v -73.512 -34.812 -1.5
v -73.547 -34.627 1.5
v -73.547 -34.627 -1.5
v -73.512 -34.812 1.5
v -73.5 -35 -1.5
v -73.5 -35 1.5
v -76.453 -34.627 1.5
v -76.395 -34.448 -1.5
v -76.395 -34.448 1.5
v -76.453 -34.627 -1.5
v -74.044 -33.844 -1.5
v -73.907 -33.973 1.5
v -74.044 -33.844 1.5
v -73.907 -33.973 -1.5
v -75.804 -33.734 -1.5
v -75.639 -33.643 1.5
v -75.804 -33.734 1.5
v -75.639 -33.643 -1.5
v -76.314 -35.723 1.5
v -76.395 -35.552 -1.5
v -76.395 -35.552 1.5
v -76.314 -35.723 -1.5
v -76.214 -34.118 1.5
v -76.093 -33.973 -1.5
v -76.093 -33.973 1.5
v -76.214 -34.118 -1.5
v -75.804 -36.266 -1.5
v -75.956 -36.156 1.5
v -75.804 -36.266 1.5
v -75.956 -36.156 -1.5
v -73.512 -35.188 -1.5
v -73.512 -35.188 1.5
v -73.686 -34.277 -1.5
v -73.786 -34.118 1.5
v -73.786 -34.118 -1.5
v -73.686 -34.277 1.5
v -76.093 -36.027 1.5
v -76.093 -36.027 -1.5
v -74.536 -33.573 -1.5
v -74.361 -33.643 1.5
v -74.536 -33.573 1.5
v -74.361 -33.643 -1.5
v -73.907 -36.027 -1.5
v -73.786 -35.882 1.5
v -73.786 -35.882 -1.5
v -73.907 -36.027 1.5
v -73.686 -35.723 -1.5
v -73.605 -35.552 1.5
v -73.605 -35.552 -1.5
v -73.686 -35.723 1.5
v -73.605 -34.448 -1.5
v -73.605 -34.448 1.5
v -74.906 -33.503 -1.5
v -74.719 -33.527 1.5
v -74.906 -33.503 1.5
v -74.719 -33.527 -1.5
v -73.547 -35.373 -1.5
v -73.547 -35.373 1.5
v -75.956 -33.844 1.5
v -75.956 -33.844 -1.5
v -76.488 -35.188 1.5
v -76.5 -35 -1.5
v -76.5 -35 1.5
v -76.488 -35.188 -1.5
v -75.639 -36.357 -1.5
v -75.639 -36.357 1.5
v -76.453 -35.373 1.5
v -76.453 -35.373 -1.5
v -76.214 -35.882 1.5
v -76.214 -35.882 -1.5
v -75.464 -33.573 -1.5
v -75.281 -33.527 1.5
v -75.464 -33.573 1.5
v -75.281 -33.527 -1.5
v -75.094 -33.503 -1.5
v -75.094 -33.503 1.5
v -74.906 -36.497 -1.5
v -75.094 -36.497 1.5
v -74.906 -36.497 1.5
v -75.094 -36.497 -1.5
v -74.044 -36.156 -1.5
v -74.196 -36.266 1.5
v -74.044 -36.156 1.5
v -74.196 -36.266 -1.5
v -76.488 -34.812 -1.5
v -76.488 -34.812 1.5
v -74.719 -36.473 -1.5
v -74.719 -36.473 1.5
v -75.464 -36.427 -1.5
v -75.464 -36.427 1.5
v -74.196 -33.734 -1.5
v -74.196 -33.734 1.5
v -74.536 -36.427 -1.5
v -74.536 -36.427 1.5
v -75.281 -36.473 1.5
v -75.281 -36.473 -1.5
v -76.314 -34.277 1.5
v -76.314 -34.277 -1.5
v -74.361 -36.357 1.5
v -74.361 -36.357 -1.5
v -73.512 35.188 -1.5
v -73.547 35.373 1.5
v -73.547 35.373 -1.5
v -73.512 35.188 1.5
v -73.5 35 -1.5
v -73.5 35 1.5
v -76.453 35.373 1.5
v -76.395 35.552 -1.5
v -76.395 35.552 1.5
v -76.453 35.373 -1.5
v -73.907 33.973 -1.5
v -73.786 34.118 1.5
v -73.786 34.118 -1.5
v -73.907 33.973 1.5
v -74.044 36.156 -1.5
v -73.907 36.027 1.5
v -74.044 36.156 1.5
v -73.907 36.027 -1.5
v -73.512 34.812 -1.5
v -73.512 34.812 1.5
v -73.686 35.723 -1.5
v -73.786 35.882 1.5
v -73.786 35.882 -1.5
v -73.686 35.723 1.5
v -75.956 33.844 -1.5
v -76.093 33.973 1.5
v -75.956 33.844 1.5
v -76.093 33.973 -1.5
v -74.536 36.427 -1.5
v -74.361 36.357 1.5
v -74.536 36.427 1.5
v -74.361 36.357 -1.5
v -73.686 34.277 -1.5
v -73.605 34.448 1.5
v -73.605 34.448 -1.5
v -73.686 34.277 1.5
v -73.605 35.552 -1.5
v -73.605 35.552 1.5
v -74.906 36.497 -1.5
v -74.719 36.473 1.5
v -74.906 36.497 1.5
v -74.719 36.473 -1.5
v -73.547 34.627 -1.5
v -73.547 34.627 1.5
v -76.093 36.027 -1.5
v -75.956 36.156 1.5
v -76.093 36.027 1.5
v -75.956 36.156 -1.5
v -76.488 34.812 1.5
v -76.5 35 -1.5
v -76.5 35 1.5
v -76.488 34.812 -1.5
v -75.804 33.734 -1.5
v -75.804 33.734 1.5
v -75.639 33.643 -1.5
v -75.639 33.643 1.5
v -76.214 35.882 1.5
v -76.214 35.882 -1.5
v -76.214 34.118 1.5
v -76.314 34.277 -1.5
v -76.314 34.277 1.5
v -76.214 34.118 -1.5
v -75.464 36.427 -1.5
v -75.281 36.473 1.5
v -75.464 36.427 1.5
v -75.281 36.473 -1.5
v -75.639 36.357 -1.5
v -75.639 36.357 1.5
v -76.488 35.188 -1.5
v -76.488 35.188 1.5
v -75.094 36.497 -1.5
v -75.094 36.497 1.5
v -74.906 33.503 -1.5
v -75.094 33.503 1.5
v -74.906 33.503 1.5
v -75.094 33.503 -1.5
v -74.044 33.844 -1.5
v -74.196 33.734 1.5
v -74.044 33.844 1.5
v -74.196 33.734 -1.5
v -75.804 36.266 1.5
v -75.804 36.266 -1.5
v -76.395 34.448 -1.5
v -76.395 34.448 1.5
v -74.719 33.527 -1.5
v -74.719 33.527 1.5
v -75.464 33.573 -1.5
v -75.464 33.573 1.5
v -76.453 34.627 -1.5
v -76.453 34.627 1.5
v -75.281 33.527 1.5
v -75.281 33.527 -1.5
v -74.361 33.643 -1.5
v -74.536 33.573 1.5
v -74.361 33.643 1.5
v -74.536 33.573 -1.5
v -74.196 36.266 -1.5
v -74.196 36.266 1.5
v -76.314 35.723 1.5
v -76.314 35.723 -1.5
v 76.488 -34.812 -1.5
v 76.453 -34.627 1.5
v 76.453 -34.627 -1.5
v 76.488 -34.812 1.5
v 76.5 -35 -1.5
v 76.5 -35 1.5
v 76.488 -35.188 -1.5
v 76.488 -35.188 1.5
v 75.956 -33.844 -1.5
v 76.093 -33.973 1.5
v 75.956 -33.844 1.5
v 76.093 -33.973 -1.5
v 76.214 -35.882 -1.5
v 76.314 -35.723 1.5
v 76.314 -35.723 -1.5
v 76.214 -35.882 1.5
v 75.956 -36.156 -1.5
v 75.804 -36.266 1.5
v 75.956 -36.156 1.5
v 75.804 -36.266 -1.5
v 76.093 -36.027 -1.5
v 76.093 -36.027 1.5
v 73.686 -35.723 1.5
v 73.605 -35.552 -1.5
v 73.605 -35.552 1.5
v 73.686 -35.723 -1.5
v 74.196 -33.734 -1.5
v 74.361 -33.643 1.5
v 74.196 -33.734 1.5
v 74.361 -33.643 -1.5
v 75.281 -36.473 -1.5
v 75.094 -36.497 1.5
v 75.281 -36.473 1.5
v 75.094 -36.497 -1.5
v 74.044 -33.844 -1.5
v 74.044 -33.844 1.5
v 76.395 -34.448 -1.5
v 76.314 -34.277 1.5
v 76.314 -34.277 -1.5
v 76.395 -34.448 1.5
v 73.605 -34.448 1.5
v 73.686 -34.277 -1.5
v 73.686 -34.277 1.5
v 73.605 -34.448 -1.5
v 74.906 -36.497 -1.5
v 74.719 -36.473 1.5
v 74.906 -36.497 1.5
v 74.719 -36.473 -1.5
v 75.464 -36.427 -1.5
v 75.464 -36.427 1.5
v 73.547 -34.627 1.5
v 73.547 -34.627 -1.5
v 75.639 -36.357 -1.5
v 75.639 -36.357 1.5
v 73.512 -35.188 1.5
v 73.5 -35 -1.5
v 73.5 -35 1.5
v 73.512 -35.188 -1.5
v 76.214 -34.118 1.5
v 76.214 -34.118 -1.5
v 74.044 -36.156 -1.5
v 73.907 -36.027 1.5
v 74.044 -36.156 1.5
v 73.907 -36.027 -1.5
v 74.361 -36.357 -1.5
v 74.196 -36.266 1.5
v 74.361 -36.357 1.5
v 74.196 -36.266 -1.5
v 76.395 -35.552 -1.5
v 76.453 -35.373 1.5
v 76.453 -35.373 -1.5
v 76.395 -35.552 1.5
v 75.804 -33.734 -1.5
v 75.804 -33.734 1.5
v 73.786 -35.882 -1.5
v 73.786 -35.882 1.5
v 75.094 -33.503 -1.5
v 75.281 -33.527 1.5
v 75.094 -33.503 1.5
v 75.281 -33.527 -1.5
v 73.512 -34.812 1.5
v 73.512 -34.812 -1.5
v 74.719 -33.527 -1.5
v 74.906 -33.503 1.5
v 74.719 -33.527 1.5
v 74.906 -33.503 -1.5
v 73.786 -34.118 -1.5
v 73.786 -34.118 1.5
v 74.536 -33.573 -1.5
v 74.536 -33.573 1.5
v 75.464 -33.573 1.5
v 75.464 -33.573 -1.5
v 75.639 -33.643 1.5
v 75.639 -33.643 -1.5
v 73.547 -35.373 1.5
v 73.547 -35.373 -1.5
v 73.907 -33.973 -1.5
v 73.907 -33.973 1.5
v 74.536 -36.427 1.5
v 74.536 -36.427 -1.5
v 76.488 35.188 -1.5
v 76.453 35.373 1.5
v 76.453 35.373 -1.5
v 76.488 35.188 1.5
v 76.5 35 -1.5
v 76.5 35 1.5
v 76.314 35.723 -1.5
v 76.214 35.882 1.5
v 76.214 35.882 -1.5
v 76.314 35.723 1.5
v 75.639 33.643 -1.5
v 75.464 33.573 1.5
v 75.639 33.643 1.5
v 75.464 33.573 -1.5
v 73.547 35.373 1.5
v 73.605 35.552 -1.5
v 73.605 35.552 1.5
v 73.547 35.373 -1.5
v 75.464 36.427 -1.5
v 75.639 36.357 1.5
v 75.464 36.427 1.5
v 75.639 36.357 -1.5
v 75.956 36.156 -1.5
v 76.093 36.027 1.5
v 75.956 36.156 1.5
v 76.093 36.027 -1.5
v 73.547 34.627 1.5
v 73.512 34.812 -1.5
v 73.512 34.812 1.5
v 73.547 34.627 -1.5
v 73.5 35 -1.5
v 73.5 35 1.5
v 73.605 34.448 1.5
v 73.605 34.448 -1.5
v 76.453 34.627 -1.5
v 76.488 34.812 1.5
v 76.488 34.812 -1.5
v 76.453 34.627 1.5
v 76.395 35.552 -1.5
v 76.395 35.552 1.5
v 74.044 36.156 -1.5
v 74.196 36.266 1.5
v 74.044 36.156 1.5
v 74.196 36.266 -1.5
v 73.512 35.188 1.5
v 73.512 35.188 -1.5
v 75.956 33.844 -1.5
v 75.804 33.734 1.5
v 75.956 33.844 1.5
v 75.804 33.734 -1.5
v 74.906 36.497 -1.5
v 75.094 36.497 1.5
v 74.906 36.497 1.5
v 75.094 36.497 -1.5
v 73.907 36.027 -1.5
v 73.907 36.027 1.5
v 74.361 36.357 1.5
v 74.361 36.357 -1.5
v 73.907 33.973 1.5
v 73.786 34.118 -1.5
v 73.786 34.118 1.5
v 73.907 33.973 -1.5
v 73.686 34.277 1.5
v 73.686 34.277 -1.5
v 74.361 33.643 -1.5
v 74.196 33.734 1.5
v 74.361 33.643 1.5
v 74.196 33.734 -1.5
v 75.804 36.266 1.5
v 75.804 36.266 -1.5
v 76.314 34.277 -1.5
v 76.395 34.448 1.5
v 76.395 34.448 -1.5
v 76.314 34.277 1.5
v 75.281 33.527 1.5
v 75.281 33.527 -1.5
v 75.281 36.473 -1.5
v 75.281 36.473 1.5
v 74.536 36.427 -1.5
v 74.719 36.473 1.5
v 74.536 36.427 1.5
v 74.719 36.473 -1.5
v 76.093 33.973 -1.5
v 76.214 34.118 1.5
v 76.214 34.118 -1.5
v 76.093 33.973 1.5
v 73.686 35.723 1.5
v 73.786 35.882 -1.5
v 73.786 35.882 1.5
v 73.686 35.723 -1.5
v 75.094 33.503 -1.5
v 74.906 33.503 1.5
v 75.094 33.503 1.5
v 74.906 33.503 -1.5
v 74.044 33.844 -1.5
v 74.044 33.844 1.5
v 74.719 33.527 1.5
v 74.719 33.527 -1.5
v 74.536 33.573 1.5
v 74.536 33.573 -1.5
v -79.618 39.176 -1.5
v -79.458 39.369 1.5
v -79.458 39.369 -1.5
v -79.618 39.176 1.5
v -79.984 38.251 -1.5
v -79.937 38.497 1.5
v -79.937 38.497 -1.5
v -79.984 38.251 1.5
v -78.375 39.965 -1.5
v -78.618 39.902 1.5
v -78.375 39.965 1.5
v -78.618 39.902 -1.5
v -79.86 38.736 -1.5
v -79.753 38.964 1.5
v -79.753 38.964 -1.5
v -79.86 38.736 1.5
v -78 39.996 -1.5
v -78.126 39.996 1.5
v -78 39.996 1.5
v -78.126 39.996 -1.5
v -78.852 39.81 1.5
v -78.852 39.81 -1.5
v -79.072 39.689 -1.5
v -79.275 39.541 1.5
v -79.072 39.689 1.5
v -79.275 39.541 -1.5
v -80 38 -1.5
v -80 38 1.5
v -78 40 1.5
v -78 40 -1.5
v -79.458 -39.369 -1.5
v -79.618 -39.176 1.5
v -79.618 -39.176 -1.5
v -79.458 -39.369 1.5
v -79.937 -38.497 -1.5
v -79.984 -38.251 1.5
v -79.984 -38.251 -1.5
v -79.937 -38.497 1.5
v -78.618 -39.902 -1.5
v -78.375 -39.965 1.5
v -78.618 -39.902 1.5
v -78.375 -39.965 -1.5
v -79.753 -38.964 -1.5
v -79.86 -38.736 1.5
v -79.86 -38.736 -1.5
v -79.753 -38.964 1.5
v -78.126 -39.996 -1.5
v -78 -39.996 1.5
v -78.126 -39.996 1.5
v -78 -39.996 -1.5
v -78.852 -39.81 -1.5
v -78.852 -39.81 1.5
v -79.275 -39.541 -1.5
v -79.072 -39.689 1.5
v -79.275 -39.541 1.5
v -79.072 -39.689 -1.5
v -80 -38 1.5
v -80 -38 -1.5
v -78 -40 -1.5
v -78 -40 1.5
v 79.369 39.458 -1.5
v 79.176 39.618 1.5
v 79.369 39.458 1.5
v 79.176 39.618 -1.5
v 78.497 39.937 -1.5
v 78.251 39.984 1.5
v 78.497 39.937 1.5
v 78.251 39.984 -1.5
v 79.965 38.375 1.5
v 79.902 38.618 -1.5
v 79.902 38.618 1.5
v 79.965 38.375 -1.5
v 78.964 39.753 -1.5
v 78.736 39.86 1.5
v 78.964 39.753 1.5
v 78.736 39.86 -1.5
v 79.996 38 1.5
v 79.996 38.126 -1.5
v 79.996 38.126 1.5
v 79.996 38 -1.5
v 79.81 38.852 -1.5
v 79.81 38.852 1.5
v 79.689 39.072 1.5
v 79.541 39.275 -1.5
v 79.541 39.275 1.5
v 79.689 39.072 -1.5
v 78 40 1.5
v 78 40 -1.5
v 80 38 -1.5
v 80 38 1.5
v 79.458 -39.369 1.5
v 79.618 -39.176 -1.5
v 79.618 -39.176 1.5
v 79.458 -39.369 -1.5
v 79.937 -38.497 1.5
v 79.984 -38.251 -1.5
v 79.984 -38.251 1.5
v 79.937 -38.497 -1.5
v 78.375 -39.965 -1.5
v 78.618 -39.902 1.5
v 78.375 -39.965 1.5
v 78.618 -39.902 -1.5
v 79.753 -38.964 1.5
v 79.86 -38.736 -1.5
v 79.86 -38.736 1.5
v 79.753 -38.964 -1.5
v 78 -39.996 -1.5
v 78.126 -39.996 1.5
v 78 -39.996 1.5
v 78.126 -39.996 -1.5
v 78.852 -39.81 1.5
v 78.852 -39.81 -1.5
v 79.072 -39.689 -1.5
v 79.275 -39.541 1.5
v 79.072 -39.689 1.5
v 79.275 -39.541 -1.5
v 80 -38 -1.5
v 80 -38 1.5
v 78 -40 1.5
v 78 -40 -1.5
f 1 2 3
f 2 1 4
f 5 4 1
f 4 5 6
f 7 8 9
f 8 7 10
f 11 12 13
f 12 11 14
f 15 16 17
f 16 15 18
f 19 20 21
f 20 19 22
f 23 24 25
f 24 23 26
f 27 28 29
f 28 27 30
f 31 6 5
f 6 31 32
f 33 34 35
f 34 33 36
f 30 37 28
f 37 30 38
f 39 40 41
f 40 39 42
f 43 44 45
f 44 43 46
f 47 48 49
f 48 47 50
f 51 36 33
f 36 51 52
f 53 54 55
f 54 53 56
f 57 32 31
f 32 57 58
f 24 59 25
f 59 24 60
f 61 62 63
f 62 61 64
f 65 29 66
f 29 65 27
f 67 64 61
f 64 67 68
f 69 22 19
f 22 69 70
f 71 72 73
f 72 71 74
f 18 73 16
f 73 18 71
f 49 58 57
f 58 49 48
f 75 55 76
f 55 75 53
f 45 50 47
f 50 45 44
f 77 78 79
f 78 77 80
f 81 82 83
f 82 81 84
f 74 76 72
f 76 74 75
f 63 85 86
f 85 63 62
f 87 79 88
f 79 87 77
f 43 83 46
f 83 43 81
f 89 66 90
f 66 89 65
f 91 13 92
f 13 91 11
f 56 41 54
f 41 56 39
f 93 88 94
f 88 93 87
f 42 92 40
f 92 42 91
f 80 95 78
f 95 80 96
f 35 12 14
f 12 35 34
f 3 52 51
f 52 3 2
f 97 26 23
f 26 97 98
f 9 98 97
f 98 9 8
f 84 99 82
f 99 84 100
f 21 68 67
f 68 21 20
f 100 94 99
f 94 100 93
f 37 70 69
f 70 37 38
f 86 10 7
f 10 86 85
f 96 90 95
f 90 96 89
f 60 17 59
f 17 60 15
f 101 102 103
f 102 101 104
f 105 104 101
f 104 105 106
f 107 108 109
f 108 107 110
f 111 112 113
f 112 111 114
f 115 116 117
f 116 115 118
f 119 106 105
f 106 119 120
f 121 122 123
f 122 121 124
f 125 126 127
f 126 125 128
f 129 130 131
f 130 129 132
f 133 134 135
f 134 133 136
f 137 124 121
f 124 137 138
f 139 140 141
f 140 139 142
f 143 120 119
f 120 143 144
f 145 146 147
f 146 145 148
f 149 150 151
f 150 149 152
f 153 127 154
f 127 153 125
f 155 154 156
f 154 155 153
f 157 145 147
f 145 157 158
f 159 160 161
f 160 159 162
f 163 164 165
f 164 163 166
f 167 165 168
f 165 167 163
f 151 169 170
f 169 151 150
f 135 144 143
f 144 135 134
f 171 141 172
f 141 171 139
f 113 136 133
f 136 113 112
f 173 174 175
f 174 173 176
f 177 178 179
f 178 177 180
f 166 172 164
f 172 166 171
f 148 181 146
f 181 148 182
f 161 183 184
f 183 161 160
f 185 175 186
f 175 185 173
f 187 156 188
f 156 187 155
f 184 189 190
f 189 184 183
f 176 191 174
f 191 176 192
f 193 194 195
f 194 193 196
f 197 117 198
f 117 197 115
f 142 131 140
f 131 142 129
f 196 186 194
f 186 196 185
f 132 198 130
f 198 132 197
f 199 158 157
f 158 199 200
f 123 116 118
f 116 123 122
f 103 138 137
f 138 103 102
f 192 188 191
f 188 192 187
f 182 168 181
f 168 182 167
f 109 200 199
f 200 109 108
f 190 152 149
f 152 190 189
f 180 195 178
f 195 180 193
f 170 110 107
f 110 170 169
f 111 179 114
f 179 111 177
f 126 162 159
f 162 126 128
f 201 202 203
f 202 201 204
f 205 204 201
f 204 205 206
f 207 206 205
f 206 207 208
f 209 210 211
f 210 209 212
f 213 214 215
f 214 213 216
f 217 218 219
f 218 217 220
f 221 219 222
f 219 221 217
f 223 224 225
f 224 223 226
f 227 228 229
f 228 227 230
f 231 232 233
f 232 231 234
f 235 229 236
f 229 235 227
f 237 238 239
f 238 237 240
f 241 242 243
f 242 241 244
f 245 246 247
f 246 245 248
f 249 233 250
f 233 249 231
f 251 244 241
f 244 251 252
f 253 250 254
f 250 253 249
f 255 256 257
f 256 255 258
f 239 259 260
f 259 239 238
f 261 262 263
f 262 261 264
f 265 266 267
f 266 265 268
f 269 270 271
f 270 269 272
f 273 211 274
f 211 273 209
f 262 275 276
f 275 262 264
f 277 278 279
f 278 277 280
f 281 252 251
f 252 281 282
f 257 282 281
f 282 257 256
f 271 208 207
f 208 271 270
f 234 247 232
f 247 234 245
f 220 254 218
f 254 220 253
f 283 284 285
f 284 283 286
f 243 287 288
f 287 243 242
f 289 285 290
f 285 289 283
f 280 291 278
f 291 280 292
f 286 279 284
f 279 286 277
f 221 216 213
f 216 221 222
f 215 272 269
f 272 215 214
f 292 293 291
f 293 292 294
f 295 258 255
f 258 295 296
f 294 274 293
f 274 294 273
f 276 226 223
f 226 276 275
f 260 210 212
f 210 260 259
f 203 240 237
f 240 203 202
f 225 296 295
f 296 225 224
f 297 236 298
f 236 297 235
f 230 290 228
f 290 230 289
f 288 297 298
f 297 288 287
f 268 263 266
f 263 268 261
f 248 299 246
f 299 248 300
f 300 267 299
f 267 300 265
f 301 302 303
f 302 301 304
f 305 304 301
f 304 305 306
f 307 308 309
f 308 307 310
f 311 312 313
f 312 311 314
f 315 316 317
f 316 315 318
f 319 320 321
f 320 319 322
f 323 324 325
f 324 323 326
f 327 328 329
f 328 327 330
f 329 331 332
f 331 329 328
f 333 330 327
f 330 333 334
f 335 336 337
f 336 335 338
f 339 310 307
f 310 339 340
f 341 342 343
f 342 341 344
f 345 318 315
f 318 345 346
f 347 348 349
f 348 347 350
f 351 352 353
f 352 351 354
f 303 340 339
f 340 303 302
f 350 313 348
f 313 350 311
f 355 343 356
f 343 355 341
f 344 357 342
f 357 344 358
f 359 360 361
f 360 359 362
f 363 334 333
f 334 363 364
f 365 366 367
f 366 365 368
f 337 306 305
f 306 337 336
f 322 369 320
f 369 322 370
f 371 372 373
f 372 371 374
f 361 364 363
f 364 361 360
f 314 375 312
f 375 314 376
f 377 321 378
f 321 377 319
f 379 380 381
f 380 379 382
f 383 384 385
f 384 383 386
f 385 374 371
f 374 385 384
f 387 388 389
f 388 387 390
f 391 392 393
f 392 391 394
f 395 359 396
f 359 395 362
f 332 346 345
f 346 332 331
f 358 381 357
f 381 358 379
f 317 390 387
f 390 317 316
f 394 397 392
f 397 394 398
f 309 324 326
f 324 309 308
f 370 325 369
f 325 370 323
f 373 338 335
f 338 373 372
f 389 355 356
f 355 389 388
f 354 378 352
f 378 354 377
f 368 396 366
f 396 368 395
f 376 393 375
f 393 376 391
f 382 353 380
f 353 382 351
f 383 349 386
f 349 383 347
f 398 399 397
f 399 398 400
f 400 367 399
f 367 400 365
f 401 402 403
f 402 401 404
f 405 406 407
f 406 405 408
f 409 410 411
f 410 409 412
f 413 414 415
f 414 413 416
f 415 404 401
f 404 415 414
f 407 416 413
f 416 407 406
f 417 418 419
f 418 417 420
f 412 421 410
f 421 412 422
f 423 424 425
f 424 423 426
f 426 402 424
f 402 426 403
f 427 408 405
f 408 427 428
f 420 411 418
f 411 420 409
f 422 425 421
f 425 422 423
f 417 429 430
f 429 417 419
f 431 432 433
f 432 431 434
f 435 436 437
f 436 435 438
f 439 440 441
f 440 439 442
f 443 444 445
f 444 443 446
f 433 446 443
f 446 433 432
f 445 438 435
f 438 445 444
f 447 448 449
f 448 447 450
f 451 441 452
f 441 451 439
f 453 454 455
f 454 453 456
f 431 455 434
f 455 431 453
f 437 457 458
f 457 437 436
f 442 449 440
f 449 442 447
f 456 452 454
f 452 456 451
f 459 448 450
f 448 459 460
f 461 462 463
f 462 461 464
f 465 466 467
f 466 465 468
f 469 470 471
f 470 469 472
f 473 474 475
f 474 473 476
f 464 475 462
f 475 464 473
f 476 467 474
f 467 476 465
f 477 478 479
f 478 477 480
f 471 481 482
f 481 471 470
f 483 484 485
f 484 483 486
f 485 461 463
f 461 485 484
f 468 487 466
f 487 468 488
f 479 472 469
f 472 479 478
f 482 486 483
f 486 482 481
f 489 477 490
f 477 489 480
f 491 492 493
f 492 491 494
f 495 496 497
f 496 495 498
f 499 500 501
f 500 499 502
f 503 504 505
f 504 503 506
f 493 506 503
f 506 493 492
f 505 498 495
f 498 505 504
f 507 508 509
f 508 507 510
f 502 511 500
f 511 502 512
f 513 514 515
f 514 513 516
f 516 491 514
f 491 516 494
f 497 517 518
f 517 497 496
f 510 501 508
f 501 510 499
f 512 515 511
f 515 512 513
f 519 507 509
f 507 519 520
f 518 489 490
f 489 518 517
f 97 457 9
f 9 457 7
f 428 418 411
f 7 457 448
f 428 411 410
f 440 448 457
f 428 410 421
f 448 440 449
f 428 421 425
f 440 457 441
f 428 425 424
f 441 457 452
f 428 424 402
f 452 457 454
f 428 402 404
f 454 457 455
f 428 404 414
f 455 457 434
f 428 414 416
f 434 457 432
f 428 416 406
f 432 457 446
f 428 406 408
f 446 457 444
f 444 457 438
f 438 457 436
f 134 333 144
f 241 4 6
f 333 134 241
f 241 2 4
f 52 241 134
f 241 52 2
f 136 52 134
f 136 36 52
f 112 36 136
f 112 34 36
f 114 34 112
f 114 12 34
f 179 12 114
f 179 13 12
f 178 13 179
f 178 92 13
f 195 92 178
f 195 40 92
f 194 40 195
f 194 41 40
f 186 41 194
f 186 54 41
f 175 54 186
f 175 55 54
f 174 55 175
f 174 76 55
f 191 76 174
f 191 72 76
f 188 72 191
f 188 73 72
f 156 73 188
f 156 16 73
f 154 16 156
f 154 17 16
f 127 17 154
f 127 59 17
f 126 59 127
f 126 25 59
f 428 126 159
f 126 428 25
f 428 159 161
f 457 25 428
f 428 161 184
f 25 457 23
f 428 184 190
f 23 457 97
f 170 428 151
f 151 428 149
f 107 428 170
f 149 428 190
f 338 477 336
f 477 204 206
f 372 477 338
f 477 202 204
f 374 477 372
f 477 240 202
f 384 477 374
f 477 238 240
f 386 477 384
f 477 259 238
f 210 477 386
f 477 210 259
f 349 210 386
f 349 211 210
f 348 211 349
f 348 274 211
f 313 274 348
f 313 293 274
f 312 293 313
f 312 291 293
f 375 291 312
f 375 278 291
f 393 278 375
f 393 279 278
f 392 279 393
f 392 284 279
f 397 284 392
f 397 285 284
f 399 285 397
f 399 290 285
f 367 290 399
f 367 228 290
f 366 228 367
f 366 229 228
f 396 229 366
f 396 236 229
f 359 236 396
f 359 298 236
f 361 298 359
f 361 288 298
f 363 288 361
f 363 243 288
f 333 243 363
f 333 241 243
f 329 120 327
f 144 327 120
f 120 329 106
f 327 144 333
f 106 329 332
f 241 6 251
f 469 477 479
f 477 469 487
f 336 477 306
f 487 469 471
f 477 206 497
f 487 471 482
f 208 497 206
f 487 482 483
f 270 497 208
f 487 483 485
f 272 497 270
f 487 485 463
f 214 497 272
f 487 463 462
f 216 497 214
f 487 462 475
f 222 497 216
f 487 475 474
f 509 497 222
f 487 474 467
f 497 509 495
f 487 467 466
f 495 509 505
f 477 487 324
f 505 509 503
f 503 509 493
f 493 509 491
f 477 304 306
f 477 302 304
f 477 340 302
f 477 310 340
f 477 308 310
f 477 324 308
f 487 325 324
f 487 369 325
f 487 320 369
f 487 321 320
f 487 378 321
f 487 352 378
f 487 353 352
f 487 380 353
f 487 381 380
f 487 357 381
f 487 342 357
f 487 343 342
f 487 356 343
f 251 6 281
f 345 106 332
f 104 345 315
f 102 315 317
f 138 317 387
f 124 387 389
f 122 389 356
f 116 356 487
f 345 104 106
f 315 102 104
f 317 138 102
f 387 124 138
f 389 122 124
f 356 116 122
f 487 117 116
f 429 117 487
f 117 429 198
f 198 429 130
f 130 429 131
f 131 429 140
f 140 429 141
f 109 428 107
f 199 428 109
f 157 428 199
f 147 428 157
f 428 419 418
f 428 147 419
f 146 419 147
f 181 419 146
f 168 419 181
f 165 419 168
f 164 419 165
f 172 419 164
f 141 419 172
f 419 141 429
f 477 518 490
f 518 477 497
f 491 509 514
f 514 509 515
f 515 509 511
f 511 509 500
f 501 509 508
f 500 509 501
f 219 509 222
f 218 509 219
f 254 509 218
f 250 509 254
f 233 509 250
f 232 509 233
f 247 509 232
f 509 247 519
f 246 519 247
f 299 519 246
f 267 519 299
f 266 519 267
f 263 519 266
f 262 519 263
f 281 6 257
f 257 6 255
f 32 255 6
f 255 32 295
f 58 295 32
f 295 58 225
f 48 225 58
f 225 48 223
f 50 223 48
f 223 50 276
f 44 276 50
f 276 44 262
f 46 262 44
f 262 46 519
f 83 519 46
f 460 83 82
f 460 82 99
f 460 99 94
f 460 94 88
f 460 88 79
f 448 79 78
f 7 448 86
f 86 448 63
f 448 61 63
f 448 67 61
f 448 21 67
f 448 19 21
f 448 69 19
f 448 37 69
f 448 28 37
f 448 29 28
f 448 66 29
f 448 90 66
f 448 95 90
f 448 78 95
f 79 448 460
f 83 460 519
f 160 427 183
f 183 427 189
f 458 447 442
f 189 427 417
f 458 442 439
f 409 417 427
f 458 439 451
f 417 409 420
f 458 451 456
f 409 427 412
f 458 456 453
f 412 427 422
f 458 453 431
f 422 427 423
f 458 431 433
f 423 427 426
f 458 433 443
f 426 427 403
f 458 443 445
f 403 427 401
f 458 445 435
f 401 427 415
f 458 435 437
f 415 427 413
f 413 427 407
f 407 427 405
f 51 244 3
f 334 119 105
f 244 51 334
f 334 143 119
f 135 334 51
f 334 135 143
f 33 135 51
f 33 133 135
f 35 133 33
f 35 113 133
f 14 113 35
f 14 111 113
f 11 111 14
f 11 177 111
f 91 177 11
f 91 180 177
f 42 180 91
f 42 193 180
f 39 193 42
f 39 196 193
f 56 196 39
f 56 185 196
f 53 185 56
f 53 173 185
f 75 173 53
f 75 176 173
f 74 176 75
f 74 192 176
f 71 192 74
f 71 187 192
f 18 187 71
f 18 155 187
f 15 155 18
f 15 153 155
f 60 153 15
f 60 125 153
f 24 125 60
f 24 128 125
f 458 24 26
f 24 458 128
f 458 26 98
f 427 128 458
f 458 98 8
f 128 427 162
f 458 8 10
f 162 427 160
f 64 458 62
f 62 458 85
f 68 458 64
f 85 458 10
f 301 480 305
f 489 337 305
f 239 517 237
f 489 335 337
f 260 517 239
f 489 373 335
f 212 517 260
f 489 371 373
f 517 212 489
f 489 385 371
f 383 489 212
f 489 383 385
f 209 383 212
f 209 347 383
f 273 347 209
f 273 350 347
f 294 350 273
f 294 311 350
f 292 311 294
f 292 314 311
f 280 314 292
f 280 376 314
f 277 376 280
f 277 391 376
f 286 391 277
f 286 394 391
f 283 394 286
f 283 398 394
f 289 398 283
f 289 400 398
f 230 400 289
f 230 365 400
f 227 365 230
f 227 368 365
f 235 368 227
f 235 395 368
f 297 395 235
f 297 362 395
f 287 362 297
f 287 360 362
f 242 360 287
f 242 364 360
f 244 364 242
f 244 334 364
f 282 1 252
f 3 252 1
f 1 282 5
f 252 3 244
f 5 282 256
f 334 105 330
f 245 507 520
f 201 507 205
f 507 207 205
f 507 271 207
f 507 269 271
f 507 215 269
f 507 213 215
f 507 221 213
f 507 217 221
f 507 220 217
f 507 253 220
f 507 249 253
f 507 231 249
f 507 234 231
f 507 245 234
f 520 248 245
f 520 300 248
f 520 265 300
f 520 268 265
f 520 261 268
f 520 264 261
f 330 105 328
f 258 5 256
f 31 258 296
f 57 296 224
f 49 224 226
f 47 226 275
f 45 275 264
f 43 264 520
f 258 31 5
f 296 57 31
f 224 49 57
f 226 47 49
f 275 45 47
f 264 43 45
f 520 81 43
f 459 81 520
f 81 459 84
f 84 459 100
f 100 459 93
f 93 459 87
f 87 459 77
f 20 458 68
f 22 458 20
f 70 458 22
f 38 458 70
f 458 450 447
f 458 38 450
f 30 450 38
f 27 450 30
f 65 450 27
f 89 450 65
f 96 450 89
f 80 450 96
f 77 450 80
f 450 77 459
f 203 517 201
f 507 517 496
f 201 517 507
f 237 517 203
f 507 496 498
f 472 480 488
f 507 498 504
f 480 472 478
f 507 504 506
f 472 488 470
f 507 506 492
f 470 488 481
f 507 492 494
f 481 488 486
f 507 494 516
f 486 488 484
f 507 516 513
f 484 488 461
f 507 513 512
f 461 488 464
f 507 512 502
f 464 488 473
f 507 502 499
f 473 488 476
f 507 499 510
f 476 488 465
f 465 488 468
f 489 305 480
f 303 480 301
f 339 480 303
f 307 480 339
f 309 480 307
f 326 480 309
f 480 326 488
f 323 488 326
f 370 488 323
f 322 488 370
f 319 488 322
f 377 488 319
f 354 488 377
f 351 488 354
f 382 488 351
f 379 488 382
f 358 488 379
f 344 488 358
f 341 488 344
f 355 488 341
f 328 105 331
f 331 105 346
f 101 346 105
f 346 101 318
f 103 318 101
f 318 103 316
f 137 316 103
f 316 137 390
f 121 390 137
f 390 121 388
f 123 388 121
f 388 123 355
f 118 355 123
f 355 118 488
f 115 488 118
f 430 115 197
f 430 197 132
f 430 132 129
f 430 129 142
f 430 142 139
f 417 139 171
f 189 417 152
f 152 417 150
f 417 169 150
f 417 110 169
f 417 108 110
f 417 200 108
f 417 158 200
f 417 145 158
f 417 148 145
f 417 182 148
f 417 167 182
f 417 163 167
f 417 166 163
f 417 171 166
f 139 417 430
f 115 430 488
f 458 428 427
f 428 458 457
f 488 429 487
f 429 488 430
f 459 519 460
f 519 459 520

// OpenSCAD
// file: ../LIB/round_corner_mask.scad
// Copyright (c) 2014 Jérémie DECOCK <jd.jdhp@gmail.com>

module round_corner_mask(radius, spacing_x, spacing_y, height) {
	$fn=50;
	
    difference() {
        cube([2*radius+1, 2*radius+1, height], center=true);
        union() {
            cylinder(r=radius, h=height+2, center=true);
            translate([(radius+2)/2, 0, 0]) cube([radius+2, 2*radius+2, height+2], center=true);
            translate([0, (radius+2)/2, 0]) cube([2*radius+2, radius+2, height+2], center=true);
        }
    }
}

module board_round_4_corner_mask(radius, width, depth, height) {
    spacing_x = width - 2 * radius;
    spacing_y = depth - 2 * radius;
    height = height + 1;

    translate([-spacing_x/2,  spacing_y/2, 0]) mirror([0,1,0]) round_corner_mask(radius, spacing_x, spacing_y, height);
    translate([-spacing_x/2, -spacing_y/2, 0]) mirror([0,0,0]) round_corner_mask(radius, spacing_x, spacing_y, height);
    translate([ spacing_x/2,  spacing_y/2, 0]) mirror([1,1,0]) round_corner_mask(radius, spacing_x, spacing_y, height);
    translate([ spacing_x/2, -spacing_y/2, 0]) mirror([1,0,0]) round_corner_mask(radius, spacing_x, spacing_y, height);
}
// file: ../LIB/four_screw_holes.scad
// Copyright (c) 2014 Jérémie DECOCK <jd.jdhp@gmail.com>

/////////////////////////////////////////////

module four_screw_holes(radius, spacing_x, spacing_y, height) {
	for (i = [-1, 1]) {    
        for (j = [-1, 1]) {    
            translate([i*spacing_x/2, j*spacing_y/2, 0]) {        
                cylinder(r=radius, h=height, center=true, $fn=50);
            }
        }
	}
}
// file: empty_board.scad
// 2 wheel robot for Raspberry Pi (model B).

// Copyright (c) 2014 Jérémie DECOCK <jd.jdhp@gmail.com>

use <../LIB/four_screw_holes.scad>
use <../LIB/round_corner_mask.scad>

/////////////////////////////////////////////

module empty_board() {

    screw_holes_radius = 1.5;
    screw_holes_spacing_x = 150;
    screw_holes_spacing_y = 70;
    board_height = 3;
    board_corner_radius = 2;
    board_width = screw_holes_spacing_x + 10;
    board_depth = screw_holes_spacing_y + 10;

    difference() {
        cube([board_width, board_depth, board_height], center=true);
        #four_screw_holes(screw_holes_radius, screw_holes_spacing_x, screw_holes_spacing_y, board_height+1);
        #board_round_4_corner_mask(radius=board_corner_radius, width=board_width, depth=board_depth, height=board_height);
    }
}
// main file
// 2 wheel robot for Raspberry Pi (model B).

// Copyright (c) 2014 Jérémie DECOCK <jd.jdhp@gmail.com>

use <empty_board.scad>

/////////////////////////////////////////////

module rpi_board() {
    empty_board();
}

rpi_board();
